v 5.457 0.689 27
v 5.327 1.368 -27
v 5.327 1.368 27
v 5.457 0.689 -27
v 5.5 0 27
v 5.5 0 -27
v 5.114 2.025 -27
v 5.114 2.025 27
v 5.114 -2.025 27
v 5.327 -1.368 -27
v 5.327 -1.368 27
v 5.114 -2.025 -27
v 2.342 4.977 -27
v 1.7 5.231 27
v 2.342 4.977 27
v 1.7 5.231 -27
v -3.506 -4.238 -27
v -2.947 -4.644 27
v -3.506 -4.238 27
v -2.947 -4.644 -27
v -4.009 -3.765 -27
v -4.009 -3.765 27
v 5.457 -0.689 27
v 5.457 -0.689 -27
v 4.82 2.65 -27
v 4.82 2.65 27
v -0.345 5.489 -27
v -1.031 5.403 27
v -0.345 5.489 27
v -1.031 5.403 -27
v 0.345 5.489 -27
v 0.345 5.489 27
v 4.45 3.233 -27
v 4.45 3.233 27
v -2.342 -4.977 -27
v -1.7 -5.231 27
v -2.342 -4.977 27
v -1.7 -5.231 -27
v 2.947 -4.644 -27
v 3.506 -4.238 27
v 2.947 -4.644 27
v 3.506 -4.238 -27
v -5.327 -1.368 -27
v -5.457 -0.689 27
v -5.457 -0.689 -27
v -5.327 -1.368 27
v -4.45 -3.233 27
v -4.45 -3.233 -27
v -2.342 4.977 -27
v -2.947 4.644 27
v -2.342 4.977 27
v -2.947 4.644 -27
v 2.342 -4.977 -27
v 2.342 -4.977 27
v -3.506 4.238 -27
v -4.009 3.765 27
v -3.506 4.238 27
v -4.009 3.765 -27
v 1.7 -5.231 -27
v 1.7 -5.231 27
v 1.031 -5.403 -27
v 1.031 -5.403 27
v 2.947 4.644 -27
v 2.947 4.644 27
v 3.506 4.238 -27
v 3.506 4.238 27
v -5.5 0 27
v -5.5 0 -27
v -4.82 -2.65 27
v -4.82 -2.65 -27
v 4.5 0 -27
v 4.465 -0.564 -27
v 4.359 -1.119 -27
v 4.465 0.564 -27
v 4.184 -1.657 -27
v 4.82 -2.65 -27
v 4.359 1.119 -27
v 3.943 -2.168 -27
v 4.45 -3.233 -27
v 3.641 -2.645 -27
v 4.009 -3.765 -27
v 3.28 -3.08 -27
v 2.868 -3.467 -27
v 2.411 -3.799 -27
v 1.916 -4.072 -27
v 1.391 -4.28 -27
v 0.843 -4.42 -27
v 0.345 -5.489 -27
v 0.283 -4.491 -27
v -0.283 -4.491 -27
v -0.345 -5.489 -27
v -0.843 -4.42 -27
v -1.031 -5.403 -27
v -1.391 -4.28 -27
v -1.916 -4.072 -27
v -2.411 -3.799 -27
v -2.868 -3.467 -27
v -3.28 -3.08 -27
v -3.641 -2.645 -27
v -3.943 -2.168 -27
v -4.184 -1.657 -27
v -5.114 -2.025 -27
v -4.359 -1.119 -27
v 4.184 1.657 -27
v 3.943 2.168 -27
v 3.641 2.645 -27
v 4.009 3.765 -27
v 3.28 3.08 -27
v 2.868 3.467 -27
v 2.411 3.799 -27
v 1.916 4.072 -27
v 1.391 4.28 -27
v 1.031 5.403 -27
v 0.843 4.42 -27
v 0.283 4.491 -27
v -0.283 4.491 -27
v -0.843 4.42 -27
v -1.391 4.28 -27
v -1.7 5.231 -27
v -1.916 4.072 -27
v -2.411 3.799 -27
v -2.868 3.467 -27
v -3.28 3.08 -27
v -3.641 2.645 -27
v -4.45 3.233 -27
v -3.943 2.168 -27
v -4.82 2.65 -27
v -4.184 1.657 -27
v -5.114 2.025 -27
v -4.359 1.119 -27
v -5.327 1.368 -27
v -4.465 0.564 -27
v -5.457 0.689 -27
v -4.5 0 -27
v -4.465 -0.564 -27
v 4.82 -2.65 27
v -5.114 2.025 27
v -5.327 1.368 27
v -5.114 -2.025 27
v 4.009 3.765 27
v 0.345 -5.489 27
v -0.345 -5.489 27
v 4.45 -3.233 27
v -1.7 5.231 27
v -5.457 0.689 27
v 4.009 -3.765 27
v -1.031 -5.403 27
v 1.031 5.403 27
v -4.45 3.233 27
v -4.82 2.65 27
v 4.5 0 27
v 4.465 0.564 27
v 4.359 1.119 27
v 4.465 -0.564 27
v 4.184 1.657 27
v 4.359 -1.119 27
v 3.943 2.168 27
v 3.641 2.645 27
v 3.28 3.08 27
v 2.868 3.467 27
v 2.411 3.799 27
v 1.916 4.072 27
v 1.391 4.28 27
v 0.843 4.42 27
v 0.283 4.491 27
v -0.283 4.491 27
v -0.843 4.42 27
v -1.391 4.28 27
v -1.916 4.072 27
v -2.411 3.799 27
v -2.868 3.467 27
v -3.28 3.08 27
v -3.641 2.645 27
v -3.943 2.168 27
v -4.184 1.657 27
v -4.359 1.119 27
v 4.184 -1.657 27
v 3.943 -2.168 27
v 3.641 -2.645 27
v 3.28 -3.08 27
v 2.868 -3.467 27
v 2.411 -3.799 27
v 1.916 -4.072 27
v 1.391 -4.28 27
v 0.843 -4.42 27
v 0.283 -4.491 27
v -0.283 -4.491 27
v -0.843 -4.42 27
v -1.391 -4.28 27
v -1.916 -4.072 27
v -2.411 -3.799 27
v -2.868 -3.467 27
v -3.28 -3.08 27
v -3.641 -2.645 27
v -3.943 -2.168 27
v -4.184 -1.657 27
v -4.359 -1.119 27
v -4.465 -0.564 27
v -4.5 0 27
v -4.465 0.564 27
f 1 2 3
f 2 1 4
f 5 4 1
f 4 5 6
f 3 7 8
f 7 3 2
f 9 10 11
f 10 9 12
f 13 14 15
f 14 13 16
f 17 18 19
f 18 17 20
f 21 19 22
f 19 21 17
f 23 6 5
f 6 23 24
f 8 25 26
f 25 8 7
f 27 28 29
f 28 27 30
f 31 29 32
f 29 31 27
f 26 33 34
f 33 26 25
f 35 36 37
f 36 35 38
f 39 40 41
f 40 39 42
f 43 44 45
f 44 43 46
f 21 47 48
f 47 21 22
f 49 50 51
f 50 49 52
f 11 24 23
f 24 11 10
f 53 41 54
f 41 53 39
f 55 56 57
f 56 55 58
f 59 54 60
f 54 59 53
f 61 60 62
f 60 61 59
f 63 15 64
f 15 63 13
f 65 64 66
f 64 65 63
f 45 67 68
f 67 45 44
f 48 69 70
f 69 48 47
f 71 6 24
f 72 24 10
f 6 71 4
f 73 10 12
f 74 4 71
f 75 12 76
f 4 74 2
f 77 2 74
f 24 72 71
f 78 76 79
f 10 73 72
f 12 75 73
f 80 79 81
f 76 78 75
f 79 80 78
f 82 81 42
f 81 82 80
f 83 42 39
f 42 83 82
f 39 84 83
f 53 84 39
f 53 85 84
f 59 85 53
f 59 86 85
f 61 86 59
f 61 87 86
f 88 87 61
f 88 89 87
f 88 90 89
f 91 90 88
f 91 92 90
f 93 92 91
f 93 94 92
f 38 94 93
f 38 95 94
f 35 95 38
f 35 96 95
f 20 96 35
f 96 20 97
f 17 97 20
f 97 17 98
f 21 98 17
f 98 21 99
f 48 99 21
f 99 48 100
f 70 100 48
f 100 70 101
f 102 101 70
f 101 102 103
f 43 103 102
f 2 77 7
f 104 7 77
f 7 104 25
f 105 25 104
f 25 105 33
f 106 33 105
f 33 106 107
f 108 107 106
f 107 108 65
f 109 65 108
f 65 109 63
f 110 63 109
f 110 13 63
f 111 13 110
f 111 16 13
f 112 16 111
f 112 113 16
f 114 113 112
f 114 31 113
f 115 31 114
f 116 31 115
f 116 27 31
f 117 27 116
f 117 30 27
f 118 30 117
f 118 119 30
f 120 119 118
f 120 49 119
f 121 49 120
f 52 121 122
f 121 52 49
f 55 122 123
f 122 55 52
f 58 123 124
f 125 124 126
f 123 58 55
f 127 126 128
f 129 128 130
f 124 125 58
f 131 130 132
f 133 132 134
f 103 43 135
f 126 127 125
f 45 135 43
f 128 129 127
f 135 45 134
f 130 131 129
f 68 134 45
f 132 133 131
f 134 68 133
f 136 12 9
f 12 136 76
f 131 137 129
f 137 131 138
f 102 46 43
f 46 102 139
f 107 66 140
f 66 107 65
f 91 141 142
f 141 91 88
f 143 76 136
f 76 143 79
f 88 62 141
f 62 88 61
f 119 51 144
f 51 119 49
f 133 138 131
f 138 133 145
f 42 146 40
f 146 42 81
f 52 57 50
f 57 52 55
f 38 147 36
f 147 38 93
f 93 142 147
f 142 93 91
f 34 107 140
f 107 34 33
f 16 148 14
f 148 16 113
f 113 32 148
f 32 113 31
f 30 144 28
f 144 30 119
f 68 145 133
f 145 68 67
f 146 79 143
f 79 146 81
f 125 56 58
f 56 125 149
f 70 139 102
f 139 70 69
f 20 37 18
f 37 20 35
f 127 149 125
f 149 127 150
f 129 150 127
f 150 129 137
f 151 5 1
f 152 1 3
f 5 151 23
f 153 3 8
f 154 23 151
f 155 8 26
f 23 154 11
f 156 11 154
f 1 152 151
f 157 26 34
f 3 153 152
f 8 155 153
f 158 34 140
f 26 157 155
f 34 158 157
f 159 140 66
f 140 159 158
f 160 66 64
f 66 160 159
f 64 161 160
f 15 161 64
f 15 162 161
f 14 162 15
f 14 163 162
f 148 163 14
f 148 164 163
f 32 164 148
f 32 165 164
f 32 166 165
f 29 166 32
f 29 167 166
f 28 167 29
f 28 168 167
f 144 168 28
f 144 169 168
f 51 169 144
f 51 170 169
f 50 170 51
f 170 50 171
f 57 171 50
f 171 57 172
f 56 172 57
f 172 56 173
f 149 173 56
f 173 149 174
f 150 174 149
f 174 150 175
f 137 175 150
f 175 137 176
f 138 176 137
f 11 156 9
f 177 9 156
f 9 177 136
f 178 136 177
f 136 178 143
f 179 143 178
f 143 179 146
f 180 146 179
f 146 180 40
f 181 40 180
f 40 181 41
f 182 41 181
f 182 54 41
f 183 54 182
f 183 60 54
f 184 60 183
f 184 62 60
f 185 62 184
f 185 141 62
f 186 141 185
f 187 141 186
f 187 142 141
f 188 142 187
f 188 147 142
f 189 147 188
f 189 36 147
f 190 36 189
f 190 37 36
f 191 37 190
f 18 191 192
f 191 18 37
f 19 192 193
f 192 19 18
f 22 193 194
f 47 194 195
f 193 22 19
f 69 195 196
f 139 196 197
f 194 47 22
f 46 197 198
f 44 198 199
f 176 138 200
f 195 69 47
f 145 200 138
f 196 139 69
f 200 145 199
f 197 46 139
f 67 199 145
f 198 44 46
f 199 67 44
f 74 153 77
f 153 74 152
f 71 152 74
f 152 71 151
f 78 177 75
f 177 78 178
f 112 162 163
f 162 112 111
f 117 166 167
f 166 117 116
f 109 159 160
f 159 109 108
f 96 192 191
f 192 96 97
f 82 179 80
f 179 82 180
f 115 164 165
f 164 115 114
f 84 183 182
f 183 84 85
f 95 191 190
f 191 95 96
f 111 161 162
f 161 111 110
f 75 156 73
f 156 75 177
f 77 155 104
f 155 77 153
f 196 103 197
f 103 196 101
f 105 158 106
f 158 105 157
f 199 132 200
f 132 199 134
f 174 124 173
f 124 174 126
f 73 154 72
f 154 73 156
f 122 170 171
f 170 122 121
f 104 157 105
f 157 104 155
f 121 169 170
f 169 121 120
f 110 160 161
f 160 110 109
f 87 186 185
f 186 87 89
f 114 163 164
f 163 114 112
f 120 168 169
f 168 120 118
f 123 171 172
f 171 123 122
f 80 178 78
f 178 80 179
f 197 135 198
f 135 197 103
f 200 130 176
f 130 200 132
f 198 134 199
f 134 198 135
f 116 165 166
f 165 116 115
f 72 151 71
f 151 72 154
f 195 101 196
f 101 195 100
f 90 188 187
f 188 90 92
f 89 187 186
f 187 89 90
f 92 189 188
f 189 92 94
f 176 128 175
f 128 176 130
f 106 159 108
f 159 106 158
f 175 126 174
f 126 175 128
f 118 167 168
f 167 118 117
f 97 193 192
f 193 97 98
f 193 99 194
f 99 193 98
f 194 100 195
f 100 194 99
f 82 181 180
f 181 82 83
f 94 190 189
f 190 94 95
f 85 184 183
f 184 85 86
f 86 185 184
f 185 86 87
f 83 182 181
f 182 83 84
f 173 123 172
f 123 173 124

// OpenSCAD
$fn = 50;


difference() {
	union() {
		translate(v = [0, 0, -27.0000000000]) {
			cylinder(h = 54, r = 5.5000000000);
		}
	}
	union() {
		translate(v = [0, 0, -100.0000000000]) {
			cylinder(h = 200, r = 4.5000000000);
		}
	}
}
